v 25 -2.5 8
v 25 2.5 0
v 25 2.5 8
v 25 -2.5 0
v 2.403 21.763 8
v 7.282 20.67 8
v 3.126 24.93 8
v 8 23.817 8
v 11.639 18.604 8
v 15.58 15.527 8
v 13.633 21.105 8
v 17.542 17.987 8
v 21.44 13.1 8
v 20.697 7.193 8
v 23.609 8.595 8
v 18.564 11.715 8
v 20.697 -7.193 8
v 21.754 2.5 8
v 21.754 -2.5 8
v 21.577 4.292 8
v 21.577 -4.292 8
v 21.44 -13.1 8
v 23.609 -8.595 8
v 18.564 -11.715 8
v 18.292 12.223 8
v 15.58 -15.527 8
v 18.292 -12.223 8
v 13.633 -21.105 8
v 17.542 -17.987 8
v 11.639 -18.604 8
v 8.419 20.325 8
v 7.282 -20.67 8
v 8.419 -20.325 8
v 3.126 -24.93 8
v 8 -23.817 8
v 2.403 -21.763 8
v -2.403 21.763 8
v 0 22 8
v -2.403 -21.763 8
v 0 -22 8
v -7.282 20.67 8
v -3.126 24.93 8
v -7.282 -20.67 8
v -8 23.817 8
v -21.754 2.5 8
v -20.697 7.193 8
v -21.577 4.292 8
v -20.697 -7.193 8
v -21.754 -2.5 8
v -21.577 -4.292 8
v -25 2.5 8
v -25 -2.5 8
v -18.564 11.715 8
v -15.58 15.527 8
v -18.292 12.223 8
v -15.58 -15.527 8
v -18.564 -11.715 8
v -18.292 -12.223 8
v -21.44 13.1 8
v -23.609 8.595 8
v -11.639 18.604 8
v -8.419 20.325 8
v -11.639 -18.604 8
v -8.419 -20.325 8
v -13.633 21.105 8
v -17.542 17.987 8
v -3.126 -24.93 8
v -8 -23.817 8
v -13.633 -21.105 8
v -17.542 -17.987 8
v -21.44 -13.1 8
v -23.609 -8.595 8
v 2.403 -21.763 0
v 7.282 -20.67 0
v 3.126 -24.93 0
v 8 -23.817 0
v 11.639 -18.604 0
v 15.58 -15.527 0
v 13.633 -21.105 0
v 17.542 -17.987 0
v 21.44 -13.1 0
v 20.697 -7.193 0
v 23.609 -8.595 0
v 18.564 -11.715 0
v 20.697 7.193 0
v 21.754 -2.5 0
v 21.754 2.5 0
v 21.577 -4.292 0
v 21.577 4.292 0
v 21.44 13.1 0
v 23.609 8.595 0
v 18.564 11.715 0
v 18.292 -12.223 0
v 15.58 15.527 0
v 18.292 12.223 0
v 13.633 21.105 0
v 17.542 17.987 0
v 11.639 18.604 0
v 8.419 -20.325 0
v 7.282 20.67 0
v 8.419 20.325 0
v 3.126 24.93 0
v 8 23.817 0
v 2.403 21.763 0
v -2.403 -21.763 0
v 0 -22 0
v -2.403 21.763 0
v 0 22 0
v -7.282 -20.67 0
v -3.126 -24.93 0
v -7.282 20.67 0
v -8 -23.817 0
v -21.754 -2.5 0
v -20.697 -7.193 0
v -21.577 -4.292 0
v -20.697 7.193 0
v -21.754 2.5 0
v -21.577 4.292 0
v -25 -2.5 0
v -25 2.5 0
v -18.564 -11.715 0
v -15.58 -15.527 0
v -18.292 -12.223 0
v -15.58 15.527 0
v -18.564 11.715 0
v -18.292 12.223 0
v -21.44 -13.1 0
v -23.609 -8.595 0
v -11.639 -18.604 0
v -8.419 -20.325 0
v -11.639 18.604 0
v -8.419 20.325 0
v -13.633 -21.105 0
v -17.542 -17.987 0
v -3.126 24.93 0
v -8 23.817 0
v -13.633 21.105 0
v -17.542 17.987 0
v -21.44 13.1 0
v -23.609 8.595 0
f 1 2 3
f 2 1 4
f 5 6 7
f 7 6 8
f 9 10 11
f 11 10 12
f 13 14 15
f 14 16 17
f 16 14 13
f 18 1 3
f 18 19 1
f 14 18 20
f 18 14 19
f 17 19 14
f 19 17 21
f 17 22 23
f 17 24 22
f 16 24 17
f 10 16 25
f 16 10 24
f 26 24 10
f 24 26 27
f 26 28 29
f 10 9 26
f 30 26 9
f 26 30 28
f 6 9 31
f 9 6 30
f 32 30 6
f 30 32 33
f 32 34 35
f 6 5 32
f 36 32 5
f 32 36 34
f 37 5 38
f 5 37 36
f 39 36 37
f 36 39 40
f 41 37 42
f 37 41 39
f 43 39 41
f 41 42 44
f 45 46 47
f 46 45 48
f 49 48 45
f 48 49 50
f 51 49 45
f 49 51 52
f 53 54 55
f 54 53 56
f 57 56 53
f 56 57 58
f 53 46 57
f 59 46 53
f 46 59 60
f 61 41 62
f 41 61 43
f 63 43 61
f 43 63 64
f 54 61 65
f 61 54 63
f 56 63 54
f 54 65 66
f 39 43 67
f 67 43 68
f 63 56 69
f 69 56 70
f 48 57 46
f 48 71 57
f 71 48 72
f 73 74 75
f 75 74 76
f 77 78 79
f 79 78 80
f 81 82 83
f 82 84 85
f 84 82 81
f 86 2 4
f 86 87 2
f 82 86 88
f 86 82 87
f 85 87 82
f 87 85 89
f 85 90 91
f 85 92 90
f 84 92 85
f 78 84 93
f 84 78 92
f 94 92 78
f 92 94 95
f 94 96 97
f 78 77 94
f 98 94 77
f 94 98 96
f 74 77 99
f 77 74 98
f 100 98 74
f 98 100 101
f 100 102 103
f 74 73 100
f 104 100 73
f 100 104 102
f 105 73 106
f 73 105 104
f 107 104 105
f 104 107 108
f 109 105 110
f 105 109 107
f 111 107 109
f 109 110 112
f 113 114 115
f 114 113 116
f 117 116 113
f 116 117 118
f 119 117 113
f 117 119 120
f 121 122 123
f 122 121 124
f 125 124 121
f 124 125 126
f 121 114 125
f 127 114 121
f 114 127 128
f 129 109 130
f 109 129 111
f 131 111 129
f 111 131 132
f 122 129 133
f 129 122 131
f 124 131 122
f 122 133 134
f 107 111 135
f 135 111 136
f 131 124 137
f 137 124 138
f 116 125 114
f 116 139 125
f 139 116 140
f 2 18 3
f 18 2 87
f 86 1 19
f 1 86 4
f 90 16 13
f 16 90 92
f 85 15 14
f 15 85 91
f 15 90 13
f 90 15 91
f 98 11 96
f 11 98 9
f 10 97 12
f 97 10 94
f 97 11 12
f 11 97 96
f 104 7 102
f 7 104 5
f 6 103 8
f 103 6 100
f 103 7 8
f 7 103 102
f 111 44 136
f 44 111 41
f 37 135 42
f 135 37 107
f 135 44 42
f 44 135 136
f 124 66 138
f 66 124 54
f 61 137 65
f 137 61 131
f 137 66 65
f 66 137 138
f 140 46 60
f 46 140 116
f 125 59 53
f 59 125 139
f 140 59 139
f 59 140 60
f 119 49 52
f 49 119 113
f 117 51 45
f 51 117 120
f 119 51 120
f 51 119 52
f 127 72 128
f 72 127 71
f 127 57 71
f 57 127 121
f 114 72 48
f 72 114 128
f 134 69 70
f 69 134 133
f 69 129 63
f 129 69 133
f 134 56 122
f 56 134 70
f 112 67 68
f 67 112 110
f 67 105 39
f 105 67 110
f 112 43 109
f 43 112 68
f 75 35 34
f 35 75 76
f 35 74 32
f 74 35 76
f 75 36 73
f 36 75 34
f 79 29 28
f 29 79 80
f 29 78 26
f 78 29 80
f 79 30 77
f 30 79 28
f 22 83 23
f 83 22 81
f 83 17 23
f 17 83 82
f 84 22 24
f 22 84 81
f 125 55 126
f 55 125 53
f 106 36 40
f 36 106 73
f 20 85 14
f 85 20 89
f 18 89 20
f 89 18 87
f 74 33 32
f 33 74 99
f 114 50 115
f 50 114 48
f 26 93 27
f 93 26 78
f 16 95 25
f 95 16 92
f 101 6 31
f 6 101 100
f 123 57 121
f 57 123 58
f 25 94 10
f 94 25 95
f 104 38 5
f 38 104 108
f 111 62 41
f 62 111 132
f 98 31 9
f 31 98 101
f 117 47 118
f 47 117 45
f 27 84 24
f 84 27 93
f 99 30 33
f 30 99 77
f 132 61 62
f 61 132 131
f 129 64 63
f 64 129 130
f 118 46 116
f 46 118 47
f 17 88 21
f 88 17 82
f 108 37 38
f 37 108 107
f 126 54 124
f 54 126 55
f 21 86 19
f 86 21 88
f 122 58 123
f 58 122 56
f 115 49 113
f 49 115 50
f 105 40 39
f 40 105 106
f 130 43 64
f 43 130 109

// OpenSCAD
$fn = 32;

// ----------------------------------------------------------------------
// Spur blank: plain gear blank
// ----------------------------------------------------------------------

// --- parameters (mm) ---
disc_r = 22;              // blank root radius
disc_t = 8;               // blank thickness
n_teeth = 14;             // stub tooth count
tooth_w = 5;              // tooth width at the root
tooth_h = 3;              // tooth height above the root

out_r = disc_r + tooth_h;  // tip radius
bbox_x = 50.0;  // measured width over the teeth
bbox_y = 49.86;  // measured depth over the teeth

union() {
  cylinder(r = disc_r, h = disc_t);
  for (i = [0 : n_teeth - 1])
    rotate([0, 0, i * 360 / n_teeth])
      translate([disc_r - 1, -tooth_w / 2, 0])
        cube([tooth_h + 1, tooth_w, disc_t]);
}
